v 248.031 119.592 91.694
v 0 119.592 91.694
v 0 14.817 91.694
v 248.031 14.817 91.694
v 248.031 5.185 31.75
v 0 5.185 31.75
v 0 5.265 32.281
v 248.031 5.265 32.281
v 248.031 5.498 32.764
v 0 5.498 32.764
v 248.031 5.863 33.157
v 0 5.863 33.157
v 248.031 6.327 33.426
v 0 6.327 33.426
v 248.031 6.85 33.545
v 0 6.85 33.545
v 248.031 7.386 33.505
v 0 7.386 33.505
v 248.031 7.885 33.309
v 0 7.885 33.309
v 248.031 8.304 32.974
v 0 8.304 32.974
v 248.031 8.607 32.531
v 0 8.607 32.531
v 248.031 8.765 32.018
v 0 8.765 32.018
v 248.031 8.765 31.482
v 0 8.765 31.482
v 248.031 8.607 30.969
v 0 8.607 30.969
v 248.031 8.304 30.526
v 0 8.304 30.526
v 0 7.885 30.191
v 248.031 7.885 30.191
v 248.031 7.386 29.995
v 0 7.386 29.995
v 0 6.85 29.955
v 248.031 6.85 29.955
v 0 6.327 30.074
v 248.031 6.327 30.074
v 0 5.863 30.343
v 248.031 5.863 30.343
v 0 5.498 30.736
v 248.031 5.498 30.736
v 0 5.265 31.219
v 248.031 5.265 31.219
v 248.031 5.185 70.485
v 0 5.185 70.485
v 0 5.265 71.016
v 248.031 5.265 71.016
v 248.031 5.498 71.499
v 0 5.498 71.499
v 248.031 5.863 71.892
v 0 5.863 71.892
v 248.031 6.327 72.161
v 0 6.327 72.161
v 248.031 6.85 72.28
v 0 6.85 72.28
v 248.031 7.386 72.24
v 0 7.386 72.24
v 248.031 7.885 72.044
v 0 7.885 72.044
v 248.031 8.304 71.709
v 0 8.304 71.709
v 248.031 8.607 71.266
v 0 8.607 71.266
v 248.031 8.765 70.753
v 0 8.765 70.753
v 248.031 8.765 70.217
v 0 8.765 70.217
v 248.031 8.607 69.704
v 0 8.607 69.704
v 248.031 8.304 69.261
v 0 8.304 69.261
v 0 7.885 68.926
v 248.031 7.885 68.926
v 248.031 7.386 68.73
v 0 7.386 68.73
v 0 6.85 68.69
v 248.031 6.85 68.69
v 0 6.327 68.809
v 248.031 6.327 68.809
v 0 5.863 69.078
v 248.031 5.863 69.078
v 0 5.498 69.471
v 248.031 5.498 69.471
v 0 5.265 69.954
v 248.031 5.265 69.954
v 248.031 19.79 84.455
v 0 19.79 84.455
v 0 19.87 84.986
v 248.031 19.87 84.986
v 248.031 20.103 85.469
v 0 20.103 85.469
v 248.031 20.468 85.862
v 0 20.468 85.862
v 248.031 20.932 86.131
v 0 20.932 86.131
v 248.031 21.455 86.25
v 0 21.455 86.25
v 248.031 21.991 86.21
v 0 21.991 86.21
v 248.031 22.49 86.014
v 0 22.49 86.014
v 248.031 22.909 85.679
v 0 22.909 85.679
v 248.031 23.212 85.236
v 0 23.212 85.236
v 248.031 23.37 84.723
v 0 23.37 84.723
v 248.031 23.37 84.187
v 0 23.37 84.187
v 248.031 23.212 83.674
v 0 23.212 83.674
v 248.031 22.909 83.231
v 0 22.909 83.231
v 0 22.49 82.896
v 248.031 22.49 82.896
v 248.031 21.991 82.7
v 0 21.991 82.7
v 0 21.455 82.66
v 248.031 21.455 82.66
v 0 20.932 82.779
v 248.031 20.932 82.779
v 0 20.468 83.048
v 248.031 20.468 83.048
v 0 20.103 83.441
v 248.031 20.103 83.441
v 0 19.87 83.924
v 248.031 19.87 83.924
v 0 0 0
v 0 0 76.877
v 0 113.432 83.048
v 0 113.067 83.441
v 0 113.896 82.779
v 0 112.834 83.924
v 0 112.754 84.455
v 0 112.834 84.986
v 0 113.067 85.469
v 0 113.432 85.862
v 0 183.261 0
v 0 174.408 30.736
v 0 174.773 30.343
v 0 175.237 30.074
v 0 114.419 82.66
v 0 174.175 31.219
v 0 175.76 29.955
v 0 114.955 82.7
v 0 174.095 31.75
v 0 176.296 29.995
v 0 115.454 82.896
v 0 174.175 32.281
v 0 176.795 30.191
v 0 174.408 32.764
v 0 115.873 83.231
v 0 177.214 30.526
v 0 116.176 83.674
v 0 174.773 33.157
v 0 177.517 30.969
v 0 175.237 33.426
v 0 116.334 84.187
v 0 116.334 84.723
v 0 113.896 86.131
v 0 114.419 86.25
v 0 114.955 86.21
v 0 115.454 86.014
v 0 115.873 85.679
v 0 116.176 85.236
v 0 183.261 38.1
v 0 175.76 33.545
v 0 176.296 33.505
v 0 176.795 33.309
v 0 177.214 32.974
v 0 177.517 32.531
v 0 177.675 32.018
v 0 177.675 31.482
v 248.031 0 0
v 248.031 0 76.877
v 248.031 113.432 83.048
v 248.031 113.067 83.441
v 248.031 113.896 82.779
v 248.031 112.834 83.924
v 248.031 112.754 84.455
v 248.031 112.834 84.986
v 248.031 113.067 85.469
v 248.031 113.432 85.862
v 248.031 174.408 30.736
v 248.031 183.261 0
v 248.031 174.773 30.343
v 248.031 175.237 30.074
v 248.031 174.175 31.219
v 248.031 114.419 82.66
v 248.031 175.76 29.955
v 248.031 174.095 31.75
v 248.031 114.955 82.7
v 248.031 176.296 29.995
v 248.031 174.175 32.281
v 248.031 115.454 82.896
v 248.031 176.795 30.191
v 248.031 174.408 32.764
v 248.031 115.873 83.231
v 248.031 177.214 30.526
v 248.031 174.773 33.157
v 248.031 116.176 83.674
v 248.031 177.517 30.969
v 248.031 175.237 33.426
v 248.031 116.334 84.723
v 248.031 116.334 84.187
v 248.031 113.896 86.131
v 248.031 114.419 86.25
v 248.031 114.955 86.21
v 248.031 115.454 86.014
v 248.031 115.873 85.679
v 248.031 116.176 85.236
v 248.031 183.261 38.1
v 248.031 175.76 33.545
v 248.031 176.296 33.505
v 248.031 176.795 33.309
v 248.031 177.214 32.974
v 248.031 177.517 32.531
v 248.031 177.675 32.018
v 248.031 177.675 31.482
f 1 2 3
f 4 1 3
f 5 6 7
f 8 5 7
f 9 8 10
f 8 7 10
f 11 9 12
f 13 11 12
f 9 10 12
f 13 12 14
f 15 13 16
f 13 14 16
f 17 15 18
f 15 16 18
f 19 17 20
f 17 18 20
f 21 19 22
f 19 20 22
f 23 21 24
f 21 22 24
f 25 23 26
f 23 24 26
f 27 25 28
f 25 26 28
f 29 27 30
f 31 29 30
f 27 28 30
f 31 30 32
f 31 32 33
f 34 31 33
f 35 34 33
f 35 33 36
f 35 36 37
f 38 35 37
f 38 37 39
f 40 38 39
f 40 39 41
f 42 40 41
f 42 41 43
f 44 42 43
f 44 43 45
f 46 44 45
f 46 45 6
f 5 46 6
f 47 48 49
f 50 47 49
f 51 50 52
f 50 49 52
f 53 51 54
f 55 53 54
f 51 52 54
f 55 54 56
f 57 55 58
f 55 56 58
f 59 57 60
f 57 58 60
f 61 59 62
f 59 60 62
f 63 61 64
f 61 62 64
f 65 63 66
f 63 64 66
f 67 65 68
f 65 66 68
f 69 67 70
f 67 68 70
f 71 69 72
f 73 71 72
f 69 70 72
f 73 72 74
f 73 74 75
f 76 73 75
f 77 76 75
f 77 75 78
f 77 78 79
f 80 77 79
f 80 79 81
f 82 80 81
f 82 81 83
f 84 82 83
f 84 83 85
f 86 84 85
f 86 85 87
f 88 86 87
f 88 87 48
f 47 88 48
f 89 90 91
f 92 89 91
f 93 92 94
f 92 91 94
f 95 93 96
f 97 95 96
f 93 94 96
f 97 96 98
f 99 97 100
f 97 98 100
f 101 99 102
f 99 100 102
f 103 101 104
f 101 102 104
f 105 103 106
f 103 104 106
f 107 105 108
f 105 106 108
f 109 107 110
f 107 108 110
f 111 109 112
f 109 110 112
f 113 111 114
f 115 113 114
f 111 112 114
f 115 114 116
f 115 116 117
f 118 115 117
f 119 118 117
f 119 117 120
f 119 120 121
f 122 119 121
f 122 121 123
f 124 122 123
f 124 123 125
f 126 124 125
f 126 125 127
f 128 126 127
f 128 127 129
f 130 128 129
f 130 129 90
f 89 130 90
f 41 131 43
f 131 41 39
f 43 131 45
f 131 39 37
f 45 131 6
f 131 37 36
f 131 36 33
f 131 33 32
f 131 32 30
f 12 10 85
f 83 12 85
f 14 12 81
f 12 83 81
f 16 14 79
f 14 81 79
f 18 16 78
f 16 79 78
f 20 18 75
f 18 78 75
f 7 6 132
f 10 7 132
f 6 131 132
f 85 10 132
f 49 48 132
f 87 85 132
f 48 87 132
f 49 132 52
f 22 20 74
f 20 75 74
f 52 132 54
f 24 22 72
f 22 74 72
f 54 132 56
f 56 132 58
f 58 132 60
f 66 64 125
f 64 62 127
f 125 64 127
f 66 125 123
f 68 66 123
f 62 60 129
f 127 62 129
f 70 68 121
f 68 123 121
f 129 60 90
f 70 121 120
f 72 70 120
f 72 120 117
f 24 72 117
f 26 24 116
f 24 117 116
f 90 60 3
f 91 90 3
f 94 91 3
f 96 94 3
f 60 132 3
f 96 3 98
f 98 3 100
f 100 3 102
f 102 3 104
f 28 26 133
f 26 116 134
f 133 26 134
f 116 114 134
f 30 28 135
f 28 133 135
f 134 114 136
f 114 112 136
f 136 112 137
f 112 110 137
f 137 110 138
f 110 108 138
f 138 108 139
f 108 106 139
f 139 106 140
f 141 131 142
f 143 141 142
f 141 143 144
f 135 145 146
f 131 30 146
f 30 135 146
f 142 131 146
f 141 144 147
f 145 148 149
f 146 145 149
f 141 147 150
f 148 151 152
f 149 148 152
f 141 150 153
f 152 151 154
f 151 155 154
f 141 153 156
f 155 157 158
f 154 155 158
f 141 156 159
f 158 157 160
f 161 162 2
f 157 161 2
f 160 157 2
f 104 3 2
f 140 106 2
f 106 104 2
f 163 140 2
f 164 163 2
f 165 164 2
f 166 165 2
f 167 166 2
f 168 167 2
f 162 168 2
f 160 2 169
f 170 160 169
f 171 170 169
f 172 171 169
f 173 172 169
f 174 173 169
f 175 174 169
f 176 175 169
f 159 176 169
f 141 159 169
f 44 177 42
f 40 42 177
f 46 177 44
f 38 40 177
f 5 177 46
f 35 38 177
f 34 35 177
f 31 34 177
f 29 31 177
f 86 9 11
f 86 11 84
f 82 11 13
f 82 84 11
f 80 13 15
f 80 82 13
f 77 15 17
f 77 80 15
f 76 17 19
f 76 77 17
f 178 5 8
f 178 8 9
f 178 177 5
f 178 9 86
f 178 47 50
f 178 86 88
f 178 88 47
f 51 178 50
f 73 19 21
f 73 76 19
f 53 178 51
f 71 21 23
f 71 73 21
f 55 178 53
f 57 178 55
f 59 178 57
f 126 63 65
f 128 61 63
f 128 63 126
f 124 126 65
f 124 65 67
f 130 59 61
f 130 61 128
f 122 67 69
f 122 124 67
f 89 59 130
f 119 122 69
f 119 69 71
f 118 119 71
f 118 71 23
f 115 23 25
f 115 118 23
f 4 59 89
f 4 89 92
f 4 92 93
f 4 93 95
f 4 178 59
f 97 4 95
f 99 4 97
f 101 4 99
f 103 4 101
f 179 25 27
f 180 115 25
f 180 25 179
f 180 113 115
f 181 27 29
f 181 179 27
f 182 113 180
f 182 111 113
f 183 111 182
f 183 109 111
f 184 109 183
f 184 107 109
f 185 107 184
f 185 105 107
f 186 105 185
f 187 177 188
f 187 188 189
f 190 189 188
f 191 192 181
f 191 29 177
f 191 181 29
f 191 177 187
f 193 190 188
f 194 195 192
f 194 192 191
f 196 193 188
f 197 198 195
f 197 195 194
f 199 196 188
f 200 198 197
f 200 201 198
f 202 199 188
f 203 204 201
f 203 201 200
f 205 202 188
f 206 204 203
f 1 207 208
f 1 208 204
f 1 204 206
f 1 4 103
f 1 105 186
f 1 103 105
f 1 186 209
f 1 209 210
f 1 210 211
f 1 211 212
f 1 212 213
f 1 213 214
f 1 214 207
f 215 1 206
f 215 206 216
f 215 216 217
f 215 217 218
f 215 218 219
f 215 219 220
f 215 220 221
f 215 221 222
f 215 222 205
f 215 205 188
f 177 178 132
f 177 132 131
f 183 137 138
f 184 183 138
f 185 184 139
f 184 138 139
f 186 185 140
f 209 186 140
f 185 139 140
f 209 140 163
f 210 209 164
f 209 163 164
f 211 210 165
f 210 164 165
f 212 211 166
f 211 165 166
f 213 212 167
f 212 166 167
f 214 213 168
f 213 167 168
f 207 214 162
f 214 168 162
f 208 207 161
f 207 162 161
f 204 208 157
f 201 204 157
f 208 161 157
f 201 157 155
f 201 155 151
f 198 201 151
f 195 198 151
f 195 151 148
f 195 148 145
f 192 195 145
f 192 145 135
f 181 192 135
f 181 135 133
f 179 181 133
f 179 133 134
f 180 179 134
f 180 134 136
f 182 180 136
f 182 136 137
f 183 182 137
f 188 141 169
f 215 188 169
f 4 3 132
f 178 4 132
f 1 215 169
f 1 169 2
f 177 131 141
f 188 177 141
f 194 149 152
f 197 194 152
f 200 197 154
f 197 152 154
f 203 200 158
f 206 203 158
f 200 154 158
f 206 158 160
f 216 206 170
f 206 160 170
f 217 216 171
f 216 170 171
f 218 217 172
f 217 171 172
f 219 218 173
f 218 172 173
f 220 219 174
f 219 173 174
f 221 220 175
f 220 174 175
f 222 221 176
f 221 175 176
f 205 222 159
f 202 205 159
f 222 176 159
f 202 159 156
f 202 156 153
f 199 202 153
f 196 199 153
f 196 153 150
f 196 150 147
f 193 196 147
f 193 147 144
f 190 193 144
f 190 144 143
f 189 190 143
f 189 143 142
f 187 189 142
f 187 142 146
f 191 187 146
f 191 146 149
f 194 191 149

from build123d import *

# Parameters (mm, degrees)
F1_DEPTH = 248.031
F3_D     = 3.6


with BuildPart() as f1:
    # F0 (on Right) → F1 (new body)
    with BuildSketch(Plane.YZ):
        Polygon((0, 76.8765774002), (0, 0), (183.261, 0), (183.261, 38.1), (119.5924225998, 91.694), (14.8174225998, 91.694), align=None)
    extrude(amount=F1_DEPTH)

    # F3 (through all)
    with Locations(Plane.YZ.offset(248.031)):
        with Locations((21.59, 84.455), (6.985, 70.485), (6.985, 31.75), (175.895, 31.75), (114.554, 84.455)):
            Hole(F3_D / 2)


solid = f1.part
